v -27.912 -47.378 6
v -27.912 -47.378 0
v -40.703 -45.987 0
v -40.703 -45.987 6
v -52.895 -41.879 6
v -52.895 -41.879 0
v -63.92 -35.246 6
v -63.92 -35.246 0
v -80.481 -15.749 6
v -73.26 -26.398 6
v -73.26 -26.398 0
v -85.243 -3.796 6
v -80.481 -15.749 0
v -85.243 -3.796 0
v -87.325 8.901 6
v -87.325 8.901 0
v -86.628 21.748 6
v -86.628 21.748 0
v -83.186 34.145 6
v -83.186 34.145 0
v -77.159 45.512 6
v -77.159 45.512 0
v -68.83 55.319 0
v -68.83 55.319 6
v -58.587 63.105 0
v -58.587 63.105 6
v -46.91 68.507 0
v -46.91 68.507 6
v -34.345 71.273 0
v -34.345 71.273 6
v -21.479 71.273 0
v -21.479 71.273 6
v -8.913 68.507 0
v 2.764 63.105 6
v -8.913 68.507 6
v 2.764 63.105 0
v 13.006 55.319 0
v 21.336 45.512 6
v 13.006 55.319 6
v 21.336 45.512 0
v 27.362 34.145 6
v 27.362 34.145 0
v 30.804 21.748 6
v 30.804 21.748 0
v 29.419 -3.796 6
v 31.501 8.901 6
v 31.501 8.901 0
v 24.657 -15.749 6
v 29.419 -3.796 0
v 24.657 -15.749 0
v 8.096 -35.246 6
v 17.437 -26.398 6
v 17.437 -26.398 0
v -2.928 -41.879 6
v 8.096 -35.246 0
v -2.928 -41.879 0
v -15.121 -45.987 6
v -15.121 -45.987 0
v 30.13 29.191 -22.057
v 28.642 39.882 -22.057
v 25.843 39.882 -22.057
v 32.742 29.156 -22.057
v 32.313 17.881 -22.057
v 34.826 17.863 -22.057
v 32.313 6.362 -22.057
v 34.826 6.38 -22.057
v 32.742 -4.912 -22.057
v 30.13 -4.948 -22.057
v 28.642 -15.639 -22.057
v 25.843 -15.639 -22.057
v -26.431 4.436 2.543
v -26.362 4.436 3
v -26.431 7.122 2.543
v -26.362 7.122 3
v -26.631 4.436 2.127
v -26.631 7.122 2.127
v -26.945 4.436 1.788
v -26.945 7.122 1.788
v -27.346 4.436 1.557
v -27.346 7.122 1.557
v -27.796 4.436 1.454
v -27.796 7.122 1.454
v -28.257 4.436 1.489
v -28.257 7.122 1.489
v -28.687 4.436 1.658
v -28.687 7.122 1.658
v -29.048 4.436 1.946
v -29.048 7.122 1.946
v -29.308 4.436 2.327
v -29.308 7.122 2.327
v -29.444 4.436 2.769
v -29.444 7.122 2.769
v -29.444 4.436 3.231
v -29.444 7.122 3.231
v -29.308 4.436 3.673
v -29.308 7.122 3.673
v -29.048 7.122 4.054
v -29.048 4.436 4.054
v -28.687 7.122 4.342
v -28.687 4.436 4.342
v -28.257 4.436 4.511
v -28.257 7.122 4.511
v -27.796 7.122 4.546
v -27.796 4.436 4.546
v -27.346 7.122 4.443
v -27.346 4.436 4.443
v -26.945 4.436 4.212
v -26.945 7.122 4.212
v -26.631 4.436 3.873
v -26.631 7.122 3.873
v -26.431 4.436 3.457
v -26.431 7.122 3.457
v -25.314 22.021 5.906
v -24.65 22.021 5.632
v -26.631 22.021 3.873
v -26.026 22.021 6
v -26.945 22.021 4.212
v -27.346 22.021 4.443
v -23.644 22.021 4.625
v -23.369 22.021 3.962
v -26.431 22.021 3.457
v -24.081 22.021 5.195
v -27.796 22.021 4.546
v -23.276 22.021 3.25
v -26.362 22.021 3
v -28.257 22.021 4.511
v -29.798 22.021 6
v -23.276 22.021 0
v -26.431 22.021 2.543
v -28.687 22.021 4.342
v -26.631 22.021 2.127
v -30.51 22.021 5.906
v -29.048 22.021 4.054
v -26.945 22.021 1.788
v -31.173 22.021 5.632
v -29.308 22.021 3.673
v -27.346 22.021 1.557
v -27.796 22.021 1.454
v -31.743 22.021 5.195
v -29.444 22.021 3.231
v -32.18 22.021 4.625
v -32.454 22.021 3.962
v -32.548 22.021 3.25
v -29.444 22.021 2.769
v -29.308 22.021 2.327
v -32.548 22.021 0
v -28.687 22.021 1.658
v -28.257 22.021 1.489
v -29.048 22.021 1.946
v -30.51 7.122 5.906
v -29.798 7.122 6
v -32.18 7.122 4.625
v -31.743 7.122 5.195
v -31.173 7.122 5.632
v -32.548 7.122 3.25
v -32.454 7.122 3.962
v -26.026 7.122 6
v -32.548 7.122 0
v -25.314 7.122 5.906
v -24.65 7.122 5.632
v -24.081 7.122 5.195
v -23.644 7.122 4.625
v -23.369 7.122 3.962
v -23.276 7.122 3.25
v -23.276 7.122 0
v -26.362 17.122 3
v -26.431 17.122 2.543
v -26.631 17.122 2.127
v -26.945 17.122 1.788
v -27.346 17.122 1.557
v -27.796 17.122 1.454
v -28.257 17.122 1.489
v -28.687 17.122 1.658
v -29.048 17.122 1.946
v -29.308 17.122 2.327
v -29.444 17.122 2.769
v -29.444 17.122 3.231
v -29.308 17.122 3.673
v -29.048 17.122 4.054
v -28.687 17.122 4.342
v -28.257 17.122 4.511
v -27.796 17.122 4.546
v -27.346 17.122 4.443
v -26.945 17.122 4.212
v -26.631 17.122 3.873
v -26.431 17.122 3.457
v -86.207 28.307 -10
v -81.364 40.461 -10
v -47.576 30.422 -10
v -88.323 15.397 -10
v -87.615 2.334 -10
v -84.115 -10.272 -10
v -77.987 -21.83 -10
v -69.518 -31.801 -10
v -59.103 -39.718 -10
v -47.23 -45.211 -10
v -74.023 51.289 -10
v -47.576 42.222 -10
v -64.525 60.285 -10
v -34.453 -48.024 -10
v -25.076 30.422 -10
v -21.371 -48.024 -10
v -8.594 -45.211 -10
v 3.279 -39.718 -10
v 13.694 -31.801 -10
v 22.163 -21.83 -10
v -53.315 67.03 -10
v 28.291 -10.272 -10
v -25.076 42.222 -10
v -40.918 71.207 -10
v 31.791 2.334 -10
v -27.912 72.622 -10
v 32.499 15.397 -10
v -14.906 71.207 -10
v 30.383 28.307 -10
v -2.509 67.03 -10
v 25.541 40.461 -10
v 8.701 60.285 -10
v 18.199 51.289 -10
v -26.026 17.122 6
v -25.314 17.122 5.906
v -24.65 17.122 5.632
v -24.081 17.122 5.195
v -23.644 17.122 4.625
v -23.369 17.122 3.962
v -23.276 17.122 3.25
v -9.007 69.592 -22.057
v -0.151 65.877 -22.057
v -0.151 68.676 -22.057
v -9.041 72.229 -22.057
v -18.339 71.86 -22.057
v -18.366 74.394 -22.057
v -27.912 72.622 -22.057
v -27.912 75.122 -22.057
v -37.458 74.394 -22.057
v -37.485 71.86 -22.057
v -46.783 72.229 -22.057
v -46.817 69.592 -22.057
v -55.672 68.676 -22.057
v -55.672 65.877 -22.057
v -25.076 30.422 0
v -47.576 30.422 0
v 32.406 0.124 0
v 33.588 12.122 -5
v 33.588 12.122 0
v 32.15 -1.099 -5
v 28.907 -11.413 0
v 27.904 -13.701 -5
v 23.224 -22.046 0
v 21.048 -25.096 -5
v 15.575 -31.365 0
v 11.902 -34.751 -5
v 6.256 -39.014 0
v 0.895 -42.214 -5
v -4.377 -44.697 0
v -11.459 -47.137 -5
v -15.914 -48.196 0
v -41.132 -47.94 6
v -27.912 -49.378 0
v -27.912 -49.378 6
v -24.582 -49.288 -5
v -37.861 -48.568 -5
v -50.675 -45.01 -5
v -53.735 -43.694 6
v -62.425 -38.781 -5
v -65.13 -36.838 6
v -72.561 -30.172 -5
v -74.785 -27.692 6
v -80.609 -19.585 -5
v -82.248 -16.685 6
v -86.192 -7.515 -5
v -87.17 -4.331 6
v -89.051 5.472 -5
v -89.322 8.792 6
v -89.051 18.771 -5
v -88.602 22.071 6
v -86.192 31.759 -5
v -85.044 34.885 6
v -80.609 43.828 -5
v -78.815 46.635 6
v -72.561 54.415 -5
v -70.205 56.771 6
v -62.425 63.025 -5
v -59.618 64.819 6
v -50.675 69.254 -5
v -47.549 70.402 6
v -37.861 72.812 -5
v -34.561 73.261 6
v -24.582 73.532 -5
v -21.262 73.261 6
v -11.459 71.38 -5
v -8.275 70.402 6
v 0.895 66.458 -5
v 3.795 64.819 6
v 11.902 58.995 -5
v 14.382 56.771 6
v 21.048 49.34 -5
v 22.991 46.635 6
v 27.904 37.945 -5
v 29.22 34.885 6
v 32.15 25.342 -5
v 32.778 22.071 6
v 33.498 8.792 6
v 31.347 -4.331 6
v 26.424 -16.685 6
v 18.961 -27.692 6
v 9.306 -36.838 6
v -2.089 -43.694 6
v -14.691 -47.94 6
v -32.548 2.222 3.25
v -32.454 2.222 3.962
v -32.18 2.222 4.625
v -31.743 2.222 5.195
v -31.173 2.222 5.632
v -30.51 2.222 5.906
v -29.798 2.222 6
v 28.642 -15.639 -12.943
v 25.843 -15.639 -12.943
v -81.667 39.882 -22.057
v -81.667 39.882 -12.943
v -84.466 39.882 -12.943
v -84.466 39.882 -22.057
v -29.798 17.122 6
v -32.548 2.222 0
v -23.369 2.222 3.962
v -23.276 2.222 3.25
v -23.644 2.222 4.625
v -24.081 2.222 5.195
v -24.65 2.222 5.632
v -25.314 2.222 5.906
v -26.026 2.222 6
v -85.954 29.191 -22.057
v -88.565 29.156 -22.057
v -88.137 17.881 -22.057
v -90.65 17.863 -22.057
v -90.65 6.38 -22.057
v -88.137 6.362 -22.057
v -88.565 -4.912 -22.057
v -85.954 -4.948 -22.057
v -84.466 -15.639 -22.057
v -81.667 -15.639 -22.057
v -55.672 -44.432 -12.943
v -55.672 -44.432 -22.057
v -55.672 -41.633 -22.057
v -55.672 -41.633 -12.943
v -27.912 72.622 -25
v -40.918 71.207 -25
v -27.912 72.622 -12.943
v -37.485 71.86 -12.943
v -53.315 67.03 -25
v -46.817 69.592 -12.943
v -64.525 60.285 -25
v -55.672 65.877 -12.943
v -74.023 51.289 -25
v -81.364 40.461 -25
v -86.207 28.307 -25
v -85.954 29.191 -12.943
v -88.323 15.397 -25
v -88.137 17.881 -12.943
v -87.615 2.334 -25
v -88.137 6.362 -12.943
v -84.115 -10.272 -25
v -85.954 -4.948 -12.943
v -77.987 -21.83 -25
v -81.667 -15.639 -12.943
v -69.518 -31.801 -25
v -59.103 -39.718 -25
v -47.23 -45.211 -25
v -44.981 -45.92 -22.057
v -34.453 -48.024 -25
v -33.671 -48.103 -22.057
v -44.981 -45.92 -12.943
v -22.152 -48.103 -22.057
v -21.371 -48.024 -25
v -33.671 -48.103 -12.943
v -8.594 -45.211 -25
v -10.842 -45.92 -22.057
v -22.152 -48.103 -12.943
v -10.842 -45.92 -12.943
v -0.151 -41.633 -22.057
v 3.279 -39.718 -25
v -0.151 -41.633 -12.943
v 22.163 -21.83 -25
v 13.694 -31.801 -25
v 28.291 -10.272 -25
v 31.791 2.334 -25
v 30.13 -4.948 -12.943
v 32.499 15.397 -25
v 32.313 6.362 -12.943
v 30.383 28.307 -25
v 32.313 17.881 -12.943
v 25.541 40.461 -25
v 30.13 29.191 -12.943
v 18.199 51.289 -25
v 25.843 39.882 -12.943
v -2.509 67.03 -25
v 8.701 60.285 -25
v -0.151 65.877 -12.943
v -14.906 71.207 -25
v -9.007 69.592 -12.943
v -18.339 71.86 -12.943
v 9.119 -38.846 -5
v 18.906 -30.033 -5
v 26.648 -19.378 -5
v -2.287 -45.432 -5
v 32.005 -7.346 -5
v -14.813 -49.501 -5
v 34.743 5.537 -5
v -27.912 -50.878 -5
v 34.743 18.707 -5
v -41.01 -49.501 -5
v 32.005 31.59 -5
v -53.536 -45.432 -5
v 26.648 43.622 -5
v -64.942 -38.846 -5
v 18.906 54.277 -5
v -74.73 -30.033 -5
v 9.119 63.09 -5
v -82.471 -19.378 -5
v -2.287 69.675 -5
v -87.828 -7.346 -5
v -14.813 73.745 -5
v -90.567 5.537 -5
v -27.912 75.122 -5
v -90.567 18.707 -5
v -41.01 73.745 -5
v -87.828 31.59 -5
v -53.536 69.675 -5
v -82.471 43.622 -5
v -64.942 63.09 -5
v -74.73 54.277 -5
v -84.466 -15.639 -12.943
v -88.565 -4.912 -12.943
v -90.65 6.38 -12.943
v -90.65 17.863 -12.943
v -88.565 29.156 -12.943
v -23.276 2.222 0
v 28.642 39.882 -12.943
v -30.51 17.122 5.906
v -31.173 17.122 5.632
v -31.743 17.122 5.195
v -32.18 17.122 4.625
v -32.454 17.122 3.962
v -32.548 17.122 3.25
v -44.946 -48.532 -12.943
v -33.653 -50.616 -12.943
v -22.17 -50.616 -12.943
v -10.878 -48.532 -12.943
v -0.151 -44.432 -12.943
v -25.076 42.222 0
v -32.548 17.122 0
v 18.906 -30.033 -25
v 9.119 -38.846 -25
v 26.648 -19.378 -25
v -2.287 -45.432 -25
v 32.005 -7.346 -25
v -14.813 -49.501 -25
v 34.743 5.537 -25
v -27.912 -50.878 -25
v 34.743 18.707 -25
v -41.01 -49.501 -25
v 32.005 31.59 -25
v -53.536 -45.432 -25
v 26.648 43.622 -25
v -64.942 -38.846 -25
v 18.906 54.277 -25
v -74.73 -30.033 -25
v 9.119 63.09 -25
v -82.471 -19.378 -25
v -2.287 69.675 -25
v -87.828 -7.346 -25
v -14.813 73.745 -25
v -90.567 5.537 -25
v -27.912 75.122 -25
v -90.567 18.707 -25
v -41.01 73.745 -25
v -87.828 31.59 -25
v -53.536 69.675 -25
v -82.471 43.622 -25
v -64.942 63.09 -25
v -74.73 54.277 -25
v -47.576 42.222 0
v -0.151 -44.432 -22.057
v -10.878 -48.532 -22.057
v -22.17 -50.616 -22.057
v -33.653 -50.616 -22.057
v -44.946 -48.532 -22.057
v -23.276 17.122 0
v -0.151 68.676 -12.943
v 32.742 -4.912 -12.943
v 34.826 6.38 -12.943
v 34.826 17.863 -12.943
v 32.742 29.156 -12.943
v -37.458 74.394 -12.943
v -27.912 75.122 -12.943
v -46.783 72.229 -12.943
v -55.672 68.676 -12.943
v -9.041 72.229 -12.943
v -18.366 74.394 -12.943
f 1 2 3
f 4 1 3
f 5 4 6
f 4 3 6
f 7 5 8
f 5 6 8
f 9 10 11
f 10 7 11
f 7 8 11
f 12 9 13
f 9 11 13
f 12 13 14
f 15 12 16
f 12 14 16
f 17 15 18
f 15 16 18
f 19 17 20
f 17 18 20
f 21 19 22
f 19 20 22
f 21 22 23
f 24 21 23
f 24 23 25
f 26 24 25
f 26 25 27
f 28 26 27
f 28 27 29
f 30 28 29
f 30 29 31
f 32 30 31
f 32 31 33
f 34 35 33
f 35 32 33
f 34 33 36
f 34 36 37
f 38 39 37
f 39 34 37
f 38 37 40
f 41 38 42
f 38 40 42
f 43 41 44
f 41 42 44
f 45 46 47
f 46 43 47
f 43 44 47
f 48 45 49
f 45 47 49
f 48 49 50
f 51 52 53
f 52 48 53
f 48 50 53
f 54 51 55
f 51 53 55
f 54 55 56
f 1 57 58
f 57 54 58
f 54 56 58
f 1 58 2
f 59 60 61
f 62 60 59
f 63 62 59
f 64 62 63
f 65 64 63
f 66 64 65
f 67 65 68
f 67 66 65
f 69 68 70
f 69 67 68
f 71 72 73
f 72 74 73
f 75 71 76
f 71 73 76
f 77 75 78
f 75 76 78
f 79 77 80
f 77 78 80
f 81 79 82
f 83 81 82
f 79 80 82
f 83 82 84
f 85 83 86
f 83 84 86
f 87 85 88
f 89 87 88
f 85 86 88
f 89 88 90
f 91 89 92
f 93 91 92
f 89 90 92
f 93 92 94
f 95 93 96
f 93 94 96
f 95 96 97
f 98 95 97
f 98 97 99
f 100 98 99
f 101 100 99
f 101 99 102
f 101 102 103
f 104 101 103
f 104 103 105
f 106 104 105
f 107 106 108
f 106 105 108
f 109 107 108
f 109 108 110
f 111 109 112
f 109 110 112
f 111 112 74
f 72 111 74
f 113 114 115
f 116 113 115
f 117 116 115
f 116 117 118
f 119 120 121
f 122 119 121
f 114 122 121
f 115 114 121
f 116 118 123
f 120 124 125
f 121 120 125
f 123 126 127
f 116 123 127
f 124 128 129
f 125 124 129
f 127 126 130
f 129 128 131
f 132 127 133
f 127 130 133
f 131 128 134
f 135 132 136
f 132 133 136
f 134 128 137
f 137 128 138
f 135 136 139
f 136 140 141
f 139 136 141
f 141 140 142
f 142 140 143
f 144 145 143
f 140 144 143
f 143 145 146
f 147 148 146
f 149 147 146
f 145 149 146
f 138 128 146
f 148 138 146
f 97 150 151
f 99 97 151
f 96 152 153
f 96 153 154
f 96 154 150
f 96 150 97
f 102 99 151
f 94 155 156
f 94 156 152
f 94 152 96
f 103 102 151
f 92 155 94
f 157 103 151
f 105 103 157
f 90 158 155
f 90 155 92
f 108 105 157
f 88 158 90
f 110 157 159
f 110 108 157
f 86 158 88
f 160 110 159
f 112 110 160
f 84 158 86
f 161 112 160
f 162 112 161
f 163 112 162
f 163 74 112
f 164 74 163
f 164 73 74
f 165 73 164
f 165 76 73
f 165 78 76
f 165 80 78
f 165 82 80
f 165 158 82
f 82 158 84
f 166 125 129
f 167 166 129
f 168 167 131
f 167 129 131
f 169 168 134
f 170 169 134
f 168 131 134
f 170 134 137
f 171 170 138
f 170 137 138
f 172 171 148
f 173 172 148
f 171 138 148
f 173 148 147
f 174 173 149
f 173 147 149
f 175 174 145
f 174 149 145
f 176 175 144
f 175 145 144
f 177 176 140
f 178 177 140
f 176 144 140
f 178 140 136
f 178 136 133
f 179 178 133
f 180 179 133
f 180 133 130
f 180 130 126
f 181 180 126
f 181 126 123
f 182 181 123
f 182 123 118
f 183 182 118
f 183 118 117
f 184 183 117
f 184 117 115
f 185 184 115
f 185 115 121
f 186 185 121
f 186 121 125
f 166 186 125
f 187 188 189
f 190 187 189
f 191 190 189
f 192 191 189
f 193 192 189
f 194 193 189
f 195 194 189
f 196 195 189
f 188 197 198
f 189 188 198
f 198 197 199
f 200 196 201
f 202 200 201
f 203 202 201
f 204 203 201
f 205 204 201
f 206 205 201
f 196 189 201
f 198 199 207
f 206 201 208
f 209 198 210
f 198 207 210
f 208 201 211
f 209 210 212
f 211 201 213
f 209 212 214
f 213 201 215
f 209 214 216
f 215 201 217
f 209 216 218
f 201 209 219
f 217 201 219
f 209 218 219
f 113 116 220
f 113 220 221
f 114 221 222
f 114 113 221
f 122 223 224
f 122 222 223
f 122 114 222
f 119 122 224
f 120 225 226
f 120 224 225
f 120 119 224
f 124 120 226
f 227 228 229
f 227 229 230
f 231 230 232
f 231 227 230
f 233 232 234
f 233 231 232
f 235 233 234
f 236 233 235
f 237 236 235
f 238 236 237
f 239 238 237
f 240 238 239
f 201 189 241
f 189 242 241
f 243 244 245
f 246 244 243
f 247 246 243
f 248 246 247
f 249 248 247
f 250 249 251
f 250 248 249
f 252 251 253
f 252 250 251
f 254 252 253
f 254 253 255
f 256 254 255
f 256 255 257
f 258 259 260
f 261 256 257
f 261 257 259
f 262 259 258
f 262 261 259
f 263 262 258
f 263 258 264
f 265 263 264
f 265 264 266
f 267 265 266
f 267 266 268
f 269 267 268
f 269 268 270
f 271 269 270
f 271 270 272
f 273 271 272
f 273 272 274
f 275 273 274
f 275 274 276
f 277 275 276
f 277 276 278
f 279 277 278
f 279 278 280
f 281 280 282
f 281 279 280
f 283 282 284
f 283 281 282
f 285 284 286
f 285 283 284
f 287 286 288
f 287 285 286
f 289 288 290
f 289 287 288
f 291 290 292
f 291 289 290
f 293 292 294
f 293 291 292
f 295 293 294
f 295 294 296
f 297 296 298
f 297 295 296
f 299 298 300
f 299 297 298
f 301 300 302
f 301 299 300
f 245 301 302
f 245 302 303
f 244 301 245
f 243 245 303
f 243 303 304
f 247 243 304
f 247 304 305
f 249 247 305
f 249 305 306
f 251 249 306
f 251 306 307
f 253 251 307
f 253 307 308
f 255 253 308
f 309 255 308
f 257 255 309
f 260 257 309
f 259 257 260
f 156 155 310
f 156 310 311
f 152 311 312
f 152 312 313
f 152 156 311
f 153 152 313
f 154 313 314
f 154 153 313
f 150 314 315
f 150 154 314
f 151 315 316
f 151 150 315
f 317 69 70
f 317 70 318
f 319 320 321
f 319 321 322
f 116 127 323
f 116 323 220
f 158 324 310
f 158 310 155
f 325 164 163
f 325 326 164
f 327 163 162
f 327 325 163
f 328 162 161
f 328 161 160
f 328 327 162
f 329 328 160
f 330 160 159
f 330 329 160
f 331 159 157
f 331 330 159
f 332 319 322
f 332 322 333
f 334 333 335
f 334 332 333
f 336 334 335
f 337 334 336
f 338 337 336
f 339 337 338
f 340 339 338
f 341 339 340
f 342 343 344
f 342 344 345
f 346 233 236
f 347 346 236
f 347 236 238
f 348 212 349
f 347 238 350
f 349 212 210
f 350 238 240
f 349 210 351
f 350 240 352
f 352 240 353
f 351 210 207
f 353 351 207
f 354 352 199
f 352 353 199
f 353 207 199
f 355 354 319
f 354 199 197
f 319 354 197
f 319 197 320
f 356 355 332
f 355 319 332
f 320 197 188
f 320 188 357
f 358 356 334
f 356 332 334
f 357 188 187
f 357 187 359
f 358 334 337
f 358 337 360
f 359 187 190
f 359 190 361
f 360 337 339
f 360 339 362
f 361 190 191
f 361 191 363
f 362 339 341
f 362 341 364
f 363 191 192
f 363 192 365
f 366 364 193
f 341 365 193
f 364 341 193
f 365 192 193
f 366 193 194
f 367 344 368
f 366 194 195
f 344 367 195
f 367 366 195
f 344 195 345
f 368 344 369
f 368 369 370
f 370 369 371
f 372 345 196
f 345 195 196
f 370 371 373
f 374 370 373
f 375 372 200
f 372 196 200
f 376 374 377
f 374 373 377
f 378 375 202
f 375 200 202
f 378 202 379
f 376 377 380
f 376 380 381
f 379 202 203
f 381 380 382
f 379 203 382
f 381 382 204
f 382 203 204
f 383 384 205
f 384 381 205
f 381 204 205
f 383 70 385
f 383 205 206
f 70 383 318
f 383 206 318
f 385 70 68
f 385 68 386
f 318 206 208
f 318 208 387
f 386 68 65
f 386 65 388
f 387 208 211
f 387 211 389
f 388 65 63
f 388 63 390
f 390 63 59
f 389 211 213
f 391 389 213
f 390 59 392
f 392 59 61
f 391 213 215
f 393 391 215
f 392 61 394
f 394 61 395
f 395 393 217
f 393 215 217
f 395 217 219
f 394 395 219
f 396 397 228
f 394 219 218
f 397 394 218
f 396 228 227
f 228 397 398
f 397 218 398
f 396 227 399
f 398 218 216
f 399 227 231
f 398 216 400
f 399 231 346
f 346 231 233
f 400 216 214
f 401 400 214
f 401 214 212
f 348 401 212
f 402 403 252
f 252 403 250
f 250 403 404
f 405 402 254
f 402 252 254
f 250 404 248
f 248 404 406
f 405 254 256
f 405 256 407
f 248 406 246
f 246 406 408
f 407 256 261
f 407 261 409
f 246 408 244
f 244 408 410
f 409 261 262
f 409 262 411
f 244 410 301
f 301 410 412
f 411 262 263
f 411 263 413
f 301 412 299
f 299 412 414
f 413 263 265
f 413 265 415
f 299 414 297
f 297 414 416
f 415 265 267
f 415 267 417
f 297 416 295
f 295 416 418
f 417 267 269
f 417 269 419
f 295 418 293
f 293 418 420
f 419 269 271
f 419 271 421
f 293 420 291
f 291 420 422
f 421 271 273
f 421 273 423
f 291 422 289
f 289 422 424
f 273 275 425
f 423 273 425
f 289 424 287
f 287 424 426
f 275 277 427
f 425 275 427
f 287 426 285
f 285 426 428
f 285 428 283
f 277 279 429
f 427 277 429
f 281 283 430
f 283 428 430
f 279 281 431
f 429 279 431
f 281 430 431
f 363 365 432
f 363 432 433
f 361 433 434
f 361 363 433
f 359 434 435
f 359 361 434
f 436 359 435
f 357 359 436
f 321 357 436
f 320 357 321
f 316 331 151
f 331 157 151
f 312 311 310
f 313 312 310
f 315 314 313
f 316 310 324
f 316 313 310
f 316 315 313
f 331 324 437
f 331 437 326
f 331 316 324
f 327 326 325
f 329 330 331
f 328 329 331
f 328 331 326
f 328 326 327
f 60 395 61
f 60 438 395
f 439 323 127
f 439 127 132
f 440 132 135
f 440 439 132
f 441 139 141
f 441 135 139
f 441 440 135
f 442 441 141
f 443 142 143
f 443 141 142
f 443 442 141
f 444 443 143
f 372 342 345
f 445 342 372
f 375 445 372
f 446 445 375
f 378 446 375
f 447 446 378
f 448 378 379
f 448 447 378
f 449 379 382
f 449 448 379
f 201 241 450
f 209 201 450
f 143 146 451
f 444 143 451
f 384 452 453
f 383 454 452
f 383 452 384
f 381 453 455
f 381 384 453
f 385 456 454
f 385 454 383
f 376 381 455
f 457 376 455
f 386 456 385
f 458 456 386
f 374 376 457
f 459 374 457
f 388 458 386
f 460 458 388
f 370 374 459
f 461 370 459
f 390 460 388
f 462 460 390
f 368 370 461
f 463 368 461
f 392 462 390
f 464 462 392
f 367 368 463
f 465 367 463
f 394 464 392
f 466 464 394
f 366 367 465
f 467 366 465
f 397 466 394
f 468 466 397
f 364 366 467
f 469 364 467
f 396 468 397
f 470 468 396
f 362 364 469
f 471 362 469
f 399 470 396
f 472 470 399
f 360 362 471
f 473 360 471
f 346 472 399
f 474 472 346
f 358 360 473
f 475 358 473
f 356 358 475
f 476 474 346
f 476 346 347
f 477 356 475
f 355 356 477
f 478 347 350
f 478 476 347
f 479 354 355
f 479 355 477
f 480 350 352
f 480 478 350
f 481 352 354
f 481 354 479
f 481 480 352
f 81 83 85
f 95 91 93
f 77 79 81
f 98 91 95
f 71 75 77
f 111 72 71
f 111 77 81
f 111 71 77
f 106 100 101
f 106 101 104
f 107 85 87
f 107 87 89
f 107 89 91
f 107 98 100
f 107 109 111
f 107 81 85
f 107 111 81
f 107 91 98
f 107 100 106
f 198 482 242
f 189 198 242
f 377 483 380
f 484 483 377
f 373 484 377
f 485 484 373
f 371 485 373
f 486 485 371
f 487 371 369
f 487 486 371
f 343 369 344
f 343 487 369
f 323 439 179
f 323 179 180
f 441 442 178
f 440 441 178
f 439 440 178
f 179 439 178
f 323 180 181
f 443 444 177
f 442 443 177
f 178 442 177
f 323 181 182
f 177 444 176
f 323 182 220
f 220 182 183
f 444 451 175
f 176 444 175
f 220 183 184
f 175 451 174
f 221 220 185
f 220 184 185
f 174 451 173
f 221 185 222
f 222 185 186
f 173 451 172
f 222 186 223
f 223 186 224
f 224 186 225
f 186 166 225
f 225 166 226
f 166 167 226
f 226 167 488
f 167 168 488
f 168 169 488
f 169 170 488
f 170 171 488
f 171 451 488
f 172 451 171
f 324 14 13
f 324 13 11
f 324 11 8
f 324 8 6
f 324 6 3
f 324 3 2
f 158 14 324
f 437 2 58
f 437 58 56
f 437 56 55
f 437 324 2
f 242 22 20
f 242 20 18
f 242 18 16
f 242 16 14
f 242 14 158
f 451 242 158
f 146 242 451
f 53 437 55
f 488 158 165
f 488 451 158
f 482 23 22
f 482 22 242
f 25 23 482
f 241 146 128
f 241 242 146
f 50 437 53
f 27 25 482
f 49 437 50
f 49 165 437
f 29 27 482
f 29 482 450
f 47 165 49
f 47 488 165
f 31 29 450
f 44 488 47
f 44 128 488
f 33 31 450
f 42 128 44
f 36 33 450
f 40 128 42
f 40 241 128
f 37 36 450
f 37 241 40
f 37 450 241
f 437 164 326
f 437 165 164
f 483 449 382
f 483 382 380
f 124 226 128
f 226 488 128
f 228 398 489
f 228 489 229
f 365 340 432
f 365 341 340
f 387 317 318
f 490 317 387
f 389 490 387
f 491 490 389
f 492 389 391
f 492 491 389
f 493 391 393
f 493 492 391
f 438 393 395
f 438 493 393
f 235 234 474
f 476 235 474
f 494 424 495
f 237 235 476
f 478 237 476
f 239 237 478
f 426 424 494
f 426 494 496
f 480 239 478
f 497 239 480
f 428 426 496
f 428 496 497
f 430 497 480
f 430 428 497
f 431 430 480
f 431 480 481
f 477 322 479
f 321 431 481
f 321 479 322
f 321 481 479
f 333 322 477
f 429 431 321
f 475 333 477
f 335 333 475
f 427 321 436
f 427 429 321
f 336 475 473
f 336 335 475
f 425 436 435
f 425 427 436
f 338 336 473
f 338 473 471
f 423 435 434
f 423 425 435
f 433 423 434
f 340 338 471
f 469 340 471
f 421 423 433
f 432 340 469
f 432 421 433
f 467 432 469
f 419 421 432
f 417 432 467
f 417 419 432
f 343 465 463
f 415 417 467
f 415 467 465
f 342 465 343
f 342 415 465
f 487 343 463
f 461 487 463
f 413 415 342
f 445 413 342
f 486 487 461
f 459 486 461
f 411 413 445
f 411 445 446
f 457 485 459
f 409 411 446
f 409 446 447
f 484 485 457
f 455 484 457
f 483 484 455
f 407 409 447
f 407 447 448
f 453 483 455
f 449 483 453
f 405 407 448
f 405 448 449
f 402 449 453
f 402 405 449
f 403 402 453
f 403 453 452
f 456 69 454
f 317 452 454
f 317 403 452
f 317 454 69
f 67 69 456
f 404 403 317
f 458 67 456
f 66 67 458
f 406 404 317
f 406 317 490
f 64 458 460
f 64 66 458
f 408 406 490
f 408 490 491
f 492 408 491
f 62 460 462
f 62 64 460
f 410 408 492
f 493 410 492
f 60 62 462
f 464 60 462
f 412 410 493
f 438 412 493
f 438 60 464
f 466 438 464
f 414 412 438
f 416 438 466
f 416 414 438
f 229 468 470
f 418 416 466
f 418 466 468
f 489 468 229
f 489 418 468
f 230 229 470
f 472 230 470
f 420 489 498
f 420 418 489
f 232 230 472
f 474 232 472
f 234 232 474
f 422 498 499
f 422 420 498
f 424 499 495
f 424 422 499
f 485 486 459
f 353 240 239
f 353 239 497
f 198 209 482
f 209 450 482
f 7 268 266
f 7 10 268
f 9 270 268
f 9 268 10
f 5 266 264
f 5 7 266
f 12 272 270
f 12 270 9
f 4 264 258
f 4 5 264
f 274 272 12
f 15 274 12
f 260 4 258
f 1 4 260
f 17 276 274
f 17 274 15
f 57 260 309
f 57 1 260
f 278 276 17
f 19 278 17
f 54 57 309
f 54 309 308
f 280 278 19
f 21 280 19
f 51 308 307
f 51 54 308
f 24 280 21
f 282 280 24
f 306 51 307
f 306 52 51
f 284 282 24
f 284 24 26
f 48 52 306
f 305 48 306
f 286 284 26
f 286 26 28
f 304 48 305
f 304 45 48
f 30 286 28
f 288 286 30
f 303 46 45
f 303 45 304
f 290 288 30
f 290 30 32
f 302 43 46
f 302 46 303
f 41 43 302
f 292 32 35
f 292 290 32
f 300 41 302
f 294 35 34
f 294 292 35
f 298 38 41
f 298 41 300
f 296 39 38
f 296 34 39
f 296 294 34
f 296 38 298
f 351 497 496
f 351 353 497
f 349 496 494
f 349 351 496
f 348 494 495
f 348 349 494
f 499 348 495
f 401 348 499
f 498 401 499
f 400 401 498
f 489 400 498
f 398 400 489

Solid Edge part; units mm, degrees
sketch "Sketch1" plane through (0, 0, 0) normal (0, 0, 1) x (1, 0, 0)
  line L0 (-15.0761, 2.2218) -> (-15.0761, 52.2218)
  line L1 (-15.0761, 52.2218) -> (-57.5761, 52.2218)
  line L2 (-57.5761, 52.2218) -> (-57.5761, 2.2218)
  line L3 (-57.5761, 2.2218) -> (-15.0761, 2.2218)
  line L4 (-25.0761, 30.4218) -> (-25.0761, 42.2218)
  line L5 (-25.0761, 42.2218) -> (-47.5761, 42.2218)
  line L6 (-47.5761, 42.2218) -> (-47.5761, 30.4218)
  line L7 (-47.5761, 30.4218) -> (-25.0761, 30.4218)
  dimension "D1" = 22.5
  dimension "D2" = 11.8
  dimension "D3" = 50
  dimension "D4" = 42.5
  dimension "D5" = 4.8989
  dimension "D6" = 4.9
  dimension "D7" = 10
  dimension "D8" = 10
  dimension "D9" = 10
extrude "Protrusion1" add sketch "Sketch1" against normal blind 10
sketch "Sketch2" plane through (0, 0, 0) normal (0, 0, 1) x (1, 0, 0)
  line L0 (-23.2755, 17.1218) -> (-23.2755, 22.0207)
  line L1 (-23.2755, 22.0207) -> (-32.5481, 22.0207)
  line L2 (-32.5481, 22.0207) -> (-32.5481, 17.1218)
  line L3 (-32.5481, 17.1218) -> (-23.2755, 17.1218)
  line L4 (-23.2755, 7.1218) -> (-23.2755, 2.2218)
  line L5 (-23.2755, 2.2218) -> (-32.5481, 2.2218)
  line L6 (-32.5481, 2.2218) -> (-32.5481, 7.1218)
  line L7 (-32.5481, 7.1218) -> (-23.2755, 7.1218)
  dimension "D1" = 22.5
  dimension "D2" = 11.8
  dimension "D3" = 50
  dimension "D4" = 42.5
  dimension "D5" = 4.8989
  dimension "D6" = 4.9
  dimension "D7" = 10
  dimension "D8" = 10
  dimension "D9" = 10
extrude "ExtrudedProtrusion_3" add sketch "Sketch2" along normal blind 6
sketch "Sketch3" plane through (-27.9118, 22.0207, 3) normal (0, 1, 0) x (1, 0, 0)
  circle A0 centre (0, 0) radius 1.55
extrude "ExtrudedCutout_1" cut sketch "Sketch3" against normal blind 17.5849
sketch "Sketch4" plane through (0, 0, 0) normal (0, 0, 1) x (1, 0, 0)
  circle A0 centre (-27.9118, 12.1218) radius 61.5
extrude "ExtrudedProtrusion_4" add sketch "Sketch4" against normal blind 10
sketch "Sketch5" plane through (0, 0, 0) normal (0, 0, 1) x (1, 0, 0)
  line L0 (-47.5761, 42.2218) -> (-47.5761, 30.4218)
  line L1 (-47.5761, 30.4218) -> (-25.0761, 30.4218)
  line L2 (-25.0761, 30.4218) -> (-25.0761, 42.2218)
  line L3 (-25.0761, 42.2218) -> (-47.5761, 42.2218)
extrude "ExtrudedCutout_2" cut sketch "Sketch5" against normal blind 44.8908
sketch "Sketch6" plane through (-27.9118, 12.1218, -5) normal (0, 0, -1) x (0, 1, 0)
  circle A0 centre (0, 0) radius 60.5
  circle A1 centre (0, 0) radius 63
extrude "ExtrudedProtrusion_6" add sketch "Sketch6" along normal blind 20
sketch "Sketch7" plane through (-27.9118, -50.8782, -15) normal (0, -1, 0) x (0, 0, 1)
  line L0 (-7.0569, 27.7607) -> (2.0569, 27.7607)
  line L1 (2.0569, 27.7607) -> (2.0569, -27.7607)
  line L2 (2.0569, -27.7607) -> (-7.0569, -27.7607)
  line L3 (-7.0569, -27.7607) -> (-7.0569, 27.7607)
extrude "ExtrudedCutout_3" cut sketch "Sketch7" against normal blind 172.1374
pattern_circular "Pattern_1" count 4 over 360 about axis through (-27.9118, 12.1218, -25) along (0, 0, 1) of "ExtrudedCutout_3"
sketch "Sketch8" plane through (-27.9118, 12.1218, 0) normal (0, 0, 1) x (0, -1, 0)
  circle A0 centre (0, 0) radius 59.5
  circle A1 centre (0, 0) radius 61.5
extrude "Protrusion2" add sketch "Sketch8" along normal blind 6
fillet "Round_1" radius 2.75 4 edges at (-32.5481, 4.6718, 6) (-23.2755, 4.6718, 6) (-32.5481, 19.5713, 6) (-23.2755, 19.5713, 6)
